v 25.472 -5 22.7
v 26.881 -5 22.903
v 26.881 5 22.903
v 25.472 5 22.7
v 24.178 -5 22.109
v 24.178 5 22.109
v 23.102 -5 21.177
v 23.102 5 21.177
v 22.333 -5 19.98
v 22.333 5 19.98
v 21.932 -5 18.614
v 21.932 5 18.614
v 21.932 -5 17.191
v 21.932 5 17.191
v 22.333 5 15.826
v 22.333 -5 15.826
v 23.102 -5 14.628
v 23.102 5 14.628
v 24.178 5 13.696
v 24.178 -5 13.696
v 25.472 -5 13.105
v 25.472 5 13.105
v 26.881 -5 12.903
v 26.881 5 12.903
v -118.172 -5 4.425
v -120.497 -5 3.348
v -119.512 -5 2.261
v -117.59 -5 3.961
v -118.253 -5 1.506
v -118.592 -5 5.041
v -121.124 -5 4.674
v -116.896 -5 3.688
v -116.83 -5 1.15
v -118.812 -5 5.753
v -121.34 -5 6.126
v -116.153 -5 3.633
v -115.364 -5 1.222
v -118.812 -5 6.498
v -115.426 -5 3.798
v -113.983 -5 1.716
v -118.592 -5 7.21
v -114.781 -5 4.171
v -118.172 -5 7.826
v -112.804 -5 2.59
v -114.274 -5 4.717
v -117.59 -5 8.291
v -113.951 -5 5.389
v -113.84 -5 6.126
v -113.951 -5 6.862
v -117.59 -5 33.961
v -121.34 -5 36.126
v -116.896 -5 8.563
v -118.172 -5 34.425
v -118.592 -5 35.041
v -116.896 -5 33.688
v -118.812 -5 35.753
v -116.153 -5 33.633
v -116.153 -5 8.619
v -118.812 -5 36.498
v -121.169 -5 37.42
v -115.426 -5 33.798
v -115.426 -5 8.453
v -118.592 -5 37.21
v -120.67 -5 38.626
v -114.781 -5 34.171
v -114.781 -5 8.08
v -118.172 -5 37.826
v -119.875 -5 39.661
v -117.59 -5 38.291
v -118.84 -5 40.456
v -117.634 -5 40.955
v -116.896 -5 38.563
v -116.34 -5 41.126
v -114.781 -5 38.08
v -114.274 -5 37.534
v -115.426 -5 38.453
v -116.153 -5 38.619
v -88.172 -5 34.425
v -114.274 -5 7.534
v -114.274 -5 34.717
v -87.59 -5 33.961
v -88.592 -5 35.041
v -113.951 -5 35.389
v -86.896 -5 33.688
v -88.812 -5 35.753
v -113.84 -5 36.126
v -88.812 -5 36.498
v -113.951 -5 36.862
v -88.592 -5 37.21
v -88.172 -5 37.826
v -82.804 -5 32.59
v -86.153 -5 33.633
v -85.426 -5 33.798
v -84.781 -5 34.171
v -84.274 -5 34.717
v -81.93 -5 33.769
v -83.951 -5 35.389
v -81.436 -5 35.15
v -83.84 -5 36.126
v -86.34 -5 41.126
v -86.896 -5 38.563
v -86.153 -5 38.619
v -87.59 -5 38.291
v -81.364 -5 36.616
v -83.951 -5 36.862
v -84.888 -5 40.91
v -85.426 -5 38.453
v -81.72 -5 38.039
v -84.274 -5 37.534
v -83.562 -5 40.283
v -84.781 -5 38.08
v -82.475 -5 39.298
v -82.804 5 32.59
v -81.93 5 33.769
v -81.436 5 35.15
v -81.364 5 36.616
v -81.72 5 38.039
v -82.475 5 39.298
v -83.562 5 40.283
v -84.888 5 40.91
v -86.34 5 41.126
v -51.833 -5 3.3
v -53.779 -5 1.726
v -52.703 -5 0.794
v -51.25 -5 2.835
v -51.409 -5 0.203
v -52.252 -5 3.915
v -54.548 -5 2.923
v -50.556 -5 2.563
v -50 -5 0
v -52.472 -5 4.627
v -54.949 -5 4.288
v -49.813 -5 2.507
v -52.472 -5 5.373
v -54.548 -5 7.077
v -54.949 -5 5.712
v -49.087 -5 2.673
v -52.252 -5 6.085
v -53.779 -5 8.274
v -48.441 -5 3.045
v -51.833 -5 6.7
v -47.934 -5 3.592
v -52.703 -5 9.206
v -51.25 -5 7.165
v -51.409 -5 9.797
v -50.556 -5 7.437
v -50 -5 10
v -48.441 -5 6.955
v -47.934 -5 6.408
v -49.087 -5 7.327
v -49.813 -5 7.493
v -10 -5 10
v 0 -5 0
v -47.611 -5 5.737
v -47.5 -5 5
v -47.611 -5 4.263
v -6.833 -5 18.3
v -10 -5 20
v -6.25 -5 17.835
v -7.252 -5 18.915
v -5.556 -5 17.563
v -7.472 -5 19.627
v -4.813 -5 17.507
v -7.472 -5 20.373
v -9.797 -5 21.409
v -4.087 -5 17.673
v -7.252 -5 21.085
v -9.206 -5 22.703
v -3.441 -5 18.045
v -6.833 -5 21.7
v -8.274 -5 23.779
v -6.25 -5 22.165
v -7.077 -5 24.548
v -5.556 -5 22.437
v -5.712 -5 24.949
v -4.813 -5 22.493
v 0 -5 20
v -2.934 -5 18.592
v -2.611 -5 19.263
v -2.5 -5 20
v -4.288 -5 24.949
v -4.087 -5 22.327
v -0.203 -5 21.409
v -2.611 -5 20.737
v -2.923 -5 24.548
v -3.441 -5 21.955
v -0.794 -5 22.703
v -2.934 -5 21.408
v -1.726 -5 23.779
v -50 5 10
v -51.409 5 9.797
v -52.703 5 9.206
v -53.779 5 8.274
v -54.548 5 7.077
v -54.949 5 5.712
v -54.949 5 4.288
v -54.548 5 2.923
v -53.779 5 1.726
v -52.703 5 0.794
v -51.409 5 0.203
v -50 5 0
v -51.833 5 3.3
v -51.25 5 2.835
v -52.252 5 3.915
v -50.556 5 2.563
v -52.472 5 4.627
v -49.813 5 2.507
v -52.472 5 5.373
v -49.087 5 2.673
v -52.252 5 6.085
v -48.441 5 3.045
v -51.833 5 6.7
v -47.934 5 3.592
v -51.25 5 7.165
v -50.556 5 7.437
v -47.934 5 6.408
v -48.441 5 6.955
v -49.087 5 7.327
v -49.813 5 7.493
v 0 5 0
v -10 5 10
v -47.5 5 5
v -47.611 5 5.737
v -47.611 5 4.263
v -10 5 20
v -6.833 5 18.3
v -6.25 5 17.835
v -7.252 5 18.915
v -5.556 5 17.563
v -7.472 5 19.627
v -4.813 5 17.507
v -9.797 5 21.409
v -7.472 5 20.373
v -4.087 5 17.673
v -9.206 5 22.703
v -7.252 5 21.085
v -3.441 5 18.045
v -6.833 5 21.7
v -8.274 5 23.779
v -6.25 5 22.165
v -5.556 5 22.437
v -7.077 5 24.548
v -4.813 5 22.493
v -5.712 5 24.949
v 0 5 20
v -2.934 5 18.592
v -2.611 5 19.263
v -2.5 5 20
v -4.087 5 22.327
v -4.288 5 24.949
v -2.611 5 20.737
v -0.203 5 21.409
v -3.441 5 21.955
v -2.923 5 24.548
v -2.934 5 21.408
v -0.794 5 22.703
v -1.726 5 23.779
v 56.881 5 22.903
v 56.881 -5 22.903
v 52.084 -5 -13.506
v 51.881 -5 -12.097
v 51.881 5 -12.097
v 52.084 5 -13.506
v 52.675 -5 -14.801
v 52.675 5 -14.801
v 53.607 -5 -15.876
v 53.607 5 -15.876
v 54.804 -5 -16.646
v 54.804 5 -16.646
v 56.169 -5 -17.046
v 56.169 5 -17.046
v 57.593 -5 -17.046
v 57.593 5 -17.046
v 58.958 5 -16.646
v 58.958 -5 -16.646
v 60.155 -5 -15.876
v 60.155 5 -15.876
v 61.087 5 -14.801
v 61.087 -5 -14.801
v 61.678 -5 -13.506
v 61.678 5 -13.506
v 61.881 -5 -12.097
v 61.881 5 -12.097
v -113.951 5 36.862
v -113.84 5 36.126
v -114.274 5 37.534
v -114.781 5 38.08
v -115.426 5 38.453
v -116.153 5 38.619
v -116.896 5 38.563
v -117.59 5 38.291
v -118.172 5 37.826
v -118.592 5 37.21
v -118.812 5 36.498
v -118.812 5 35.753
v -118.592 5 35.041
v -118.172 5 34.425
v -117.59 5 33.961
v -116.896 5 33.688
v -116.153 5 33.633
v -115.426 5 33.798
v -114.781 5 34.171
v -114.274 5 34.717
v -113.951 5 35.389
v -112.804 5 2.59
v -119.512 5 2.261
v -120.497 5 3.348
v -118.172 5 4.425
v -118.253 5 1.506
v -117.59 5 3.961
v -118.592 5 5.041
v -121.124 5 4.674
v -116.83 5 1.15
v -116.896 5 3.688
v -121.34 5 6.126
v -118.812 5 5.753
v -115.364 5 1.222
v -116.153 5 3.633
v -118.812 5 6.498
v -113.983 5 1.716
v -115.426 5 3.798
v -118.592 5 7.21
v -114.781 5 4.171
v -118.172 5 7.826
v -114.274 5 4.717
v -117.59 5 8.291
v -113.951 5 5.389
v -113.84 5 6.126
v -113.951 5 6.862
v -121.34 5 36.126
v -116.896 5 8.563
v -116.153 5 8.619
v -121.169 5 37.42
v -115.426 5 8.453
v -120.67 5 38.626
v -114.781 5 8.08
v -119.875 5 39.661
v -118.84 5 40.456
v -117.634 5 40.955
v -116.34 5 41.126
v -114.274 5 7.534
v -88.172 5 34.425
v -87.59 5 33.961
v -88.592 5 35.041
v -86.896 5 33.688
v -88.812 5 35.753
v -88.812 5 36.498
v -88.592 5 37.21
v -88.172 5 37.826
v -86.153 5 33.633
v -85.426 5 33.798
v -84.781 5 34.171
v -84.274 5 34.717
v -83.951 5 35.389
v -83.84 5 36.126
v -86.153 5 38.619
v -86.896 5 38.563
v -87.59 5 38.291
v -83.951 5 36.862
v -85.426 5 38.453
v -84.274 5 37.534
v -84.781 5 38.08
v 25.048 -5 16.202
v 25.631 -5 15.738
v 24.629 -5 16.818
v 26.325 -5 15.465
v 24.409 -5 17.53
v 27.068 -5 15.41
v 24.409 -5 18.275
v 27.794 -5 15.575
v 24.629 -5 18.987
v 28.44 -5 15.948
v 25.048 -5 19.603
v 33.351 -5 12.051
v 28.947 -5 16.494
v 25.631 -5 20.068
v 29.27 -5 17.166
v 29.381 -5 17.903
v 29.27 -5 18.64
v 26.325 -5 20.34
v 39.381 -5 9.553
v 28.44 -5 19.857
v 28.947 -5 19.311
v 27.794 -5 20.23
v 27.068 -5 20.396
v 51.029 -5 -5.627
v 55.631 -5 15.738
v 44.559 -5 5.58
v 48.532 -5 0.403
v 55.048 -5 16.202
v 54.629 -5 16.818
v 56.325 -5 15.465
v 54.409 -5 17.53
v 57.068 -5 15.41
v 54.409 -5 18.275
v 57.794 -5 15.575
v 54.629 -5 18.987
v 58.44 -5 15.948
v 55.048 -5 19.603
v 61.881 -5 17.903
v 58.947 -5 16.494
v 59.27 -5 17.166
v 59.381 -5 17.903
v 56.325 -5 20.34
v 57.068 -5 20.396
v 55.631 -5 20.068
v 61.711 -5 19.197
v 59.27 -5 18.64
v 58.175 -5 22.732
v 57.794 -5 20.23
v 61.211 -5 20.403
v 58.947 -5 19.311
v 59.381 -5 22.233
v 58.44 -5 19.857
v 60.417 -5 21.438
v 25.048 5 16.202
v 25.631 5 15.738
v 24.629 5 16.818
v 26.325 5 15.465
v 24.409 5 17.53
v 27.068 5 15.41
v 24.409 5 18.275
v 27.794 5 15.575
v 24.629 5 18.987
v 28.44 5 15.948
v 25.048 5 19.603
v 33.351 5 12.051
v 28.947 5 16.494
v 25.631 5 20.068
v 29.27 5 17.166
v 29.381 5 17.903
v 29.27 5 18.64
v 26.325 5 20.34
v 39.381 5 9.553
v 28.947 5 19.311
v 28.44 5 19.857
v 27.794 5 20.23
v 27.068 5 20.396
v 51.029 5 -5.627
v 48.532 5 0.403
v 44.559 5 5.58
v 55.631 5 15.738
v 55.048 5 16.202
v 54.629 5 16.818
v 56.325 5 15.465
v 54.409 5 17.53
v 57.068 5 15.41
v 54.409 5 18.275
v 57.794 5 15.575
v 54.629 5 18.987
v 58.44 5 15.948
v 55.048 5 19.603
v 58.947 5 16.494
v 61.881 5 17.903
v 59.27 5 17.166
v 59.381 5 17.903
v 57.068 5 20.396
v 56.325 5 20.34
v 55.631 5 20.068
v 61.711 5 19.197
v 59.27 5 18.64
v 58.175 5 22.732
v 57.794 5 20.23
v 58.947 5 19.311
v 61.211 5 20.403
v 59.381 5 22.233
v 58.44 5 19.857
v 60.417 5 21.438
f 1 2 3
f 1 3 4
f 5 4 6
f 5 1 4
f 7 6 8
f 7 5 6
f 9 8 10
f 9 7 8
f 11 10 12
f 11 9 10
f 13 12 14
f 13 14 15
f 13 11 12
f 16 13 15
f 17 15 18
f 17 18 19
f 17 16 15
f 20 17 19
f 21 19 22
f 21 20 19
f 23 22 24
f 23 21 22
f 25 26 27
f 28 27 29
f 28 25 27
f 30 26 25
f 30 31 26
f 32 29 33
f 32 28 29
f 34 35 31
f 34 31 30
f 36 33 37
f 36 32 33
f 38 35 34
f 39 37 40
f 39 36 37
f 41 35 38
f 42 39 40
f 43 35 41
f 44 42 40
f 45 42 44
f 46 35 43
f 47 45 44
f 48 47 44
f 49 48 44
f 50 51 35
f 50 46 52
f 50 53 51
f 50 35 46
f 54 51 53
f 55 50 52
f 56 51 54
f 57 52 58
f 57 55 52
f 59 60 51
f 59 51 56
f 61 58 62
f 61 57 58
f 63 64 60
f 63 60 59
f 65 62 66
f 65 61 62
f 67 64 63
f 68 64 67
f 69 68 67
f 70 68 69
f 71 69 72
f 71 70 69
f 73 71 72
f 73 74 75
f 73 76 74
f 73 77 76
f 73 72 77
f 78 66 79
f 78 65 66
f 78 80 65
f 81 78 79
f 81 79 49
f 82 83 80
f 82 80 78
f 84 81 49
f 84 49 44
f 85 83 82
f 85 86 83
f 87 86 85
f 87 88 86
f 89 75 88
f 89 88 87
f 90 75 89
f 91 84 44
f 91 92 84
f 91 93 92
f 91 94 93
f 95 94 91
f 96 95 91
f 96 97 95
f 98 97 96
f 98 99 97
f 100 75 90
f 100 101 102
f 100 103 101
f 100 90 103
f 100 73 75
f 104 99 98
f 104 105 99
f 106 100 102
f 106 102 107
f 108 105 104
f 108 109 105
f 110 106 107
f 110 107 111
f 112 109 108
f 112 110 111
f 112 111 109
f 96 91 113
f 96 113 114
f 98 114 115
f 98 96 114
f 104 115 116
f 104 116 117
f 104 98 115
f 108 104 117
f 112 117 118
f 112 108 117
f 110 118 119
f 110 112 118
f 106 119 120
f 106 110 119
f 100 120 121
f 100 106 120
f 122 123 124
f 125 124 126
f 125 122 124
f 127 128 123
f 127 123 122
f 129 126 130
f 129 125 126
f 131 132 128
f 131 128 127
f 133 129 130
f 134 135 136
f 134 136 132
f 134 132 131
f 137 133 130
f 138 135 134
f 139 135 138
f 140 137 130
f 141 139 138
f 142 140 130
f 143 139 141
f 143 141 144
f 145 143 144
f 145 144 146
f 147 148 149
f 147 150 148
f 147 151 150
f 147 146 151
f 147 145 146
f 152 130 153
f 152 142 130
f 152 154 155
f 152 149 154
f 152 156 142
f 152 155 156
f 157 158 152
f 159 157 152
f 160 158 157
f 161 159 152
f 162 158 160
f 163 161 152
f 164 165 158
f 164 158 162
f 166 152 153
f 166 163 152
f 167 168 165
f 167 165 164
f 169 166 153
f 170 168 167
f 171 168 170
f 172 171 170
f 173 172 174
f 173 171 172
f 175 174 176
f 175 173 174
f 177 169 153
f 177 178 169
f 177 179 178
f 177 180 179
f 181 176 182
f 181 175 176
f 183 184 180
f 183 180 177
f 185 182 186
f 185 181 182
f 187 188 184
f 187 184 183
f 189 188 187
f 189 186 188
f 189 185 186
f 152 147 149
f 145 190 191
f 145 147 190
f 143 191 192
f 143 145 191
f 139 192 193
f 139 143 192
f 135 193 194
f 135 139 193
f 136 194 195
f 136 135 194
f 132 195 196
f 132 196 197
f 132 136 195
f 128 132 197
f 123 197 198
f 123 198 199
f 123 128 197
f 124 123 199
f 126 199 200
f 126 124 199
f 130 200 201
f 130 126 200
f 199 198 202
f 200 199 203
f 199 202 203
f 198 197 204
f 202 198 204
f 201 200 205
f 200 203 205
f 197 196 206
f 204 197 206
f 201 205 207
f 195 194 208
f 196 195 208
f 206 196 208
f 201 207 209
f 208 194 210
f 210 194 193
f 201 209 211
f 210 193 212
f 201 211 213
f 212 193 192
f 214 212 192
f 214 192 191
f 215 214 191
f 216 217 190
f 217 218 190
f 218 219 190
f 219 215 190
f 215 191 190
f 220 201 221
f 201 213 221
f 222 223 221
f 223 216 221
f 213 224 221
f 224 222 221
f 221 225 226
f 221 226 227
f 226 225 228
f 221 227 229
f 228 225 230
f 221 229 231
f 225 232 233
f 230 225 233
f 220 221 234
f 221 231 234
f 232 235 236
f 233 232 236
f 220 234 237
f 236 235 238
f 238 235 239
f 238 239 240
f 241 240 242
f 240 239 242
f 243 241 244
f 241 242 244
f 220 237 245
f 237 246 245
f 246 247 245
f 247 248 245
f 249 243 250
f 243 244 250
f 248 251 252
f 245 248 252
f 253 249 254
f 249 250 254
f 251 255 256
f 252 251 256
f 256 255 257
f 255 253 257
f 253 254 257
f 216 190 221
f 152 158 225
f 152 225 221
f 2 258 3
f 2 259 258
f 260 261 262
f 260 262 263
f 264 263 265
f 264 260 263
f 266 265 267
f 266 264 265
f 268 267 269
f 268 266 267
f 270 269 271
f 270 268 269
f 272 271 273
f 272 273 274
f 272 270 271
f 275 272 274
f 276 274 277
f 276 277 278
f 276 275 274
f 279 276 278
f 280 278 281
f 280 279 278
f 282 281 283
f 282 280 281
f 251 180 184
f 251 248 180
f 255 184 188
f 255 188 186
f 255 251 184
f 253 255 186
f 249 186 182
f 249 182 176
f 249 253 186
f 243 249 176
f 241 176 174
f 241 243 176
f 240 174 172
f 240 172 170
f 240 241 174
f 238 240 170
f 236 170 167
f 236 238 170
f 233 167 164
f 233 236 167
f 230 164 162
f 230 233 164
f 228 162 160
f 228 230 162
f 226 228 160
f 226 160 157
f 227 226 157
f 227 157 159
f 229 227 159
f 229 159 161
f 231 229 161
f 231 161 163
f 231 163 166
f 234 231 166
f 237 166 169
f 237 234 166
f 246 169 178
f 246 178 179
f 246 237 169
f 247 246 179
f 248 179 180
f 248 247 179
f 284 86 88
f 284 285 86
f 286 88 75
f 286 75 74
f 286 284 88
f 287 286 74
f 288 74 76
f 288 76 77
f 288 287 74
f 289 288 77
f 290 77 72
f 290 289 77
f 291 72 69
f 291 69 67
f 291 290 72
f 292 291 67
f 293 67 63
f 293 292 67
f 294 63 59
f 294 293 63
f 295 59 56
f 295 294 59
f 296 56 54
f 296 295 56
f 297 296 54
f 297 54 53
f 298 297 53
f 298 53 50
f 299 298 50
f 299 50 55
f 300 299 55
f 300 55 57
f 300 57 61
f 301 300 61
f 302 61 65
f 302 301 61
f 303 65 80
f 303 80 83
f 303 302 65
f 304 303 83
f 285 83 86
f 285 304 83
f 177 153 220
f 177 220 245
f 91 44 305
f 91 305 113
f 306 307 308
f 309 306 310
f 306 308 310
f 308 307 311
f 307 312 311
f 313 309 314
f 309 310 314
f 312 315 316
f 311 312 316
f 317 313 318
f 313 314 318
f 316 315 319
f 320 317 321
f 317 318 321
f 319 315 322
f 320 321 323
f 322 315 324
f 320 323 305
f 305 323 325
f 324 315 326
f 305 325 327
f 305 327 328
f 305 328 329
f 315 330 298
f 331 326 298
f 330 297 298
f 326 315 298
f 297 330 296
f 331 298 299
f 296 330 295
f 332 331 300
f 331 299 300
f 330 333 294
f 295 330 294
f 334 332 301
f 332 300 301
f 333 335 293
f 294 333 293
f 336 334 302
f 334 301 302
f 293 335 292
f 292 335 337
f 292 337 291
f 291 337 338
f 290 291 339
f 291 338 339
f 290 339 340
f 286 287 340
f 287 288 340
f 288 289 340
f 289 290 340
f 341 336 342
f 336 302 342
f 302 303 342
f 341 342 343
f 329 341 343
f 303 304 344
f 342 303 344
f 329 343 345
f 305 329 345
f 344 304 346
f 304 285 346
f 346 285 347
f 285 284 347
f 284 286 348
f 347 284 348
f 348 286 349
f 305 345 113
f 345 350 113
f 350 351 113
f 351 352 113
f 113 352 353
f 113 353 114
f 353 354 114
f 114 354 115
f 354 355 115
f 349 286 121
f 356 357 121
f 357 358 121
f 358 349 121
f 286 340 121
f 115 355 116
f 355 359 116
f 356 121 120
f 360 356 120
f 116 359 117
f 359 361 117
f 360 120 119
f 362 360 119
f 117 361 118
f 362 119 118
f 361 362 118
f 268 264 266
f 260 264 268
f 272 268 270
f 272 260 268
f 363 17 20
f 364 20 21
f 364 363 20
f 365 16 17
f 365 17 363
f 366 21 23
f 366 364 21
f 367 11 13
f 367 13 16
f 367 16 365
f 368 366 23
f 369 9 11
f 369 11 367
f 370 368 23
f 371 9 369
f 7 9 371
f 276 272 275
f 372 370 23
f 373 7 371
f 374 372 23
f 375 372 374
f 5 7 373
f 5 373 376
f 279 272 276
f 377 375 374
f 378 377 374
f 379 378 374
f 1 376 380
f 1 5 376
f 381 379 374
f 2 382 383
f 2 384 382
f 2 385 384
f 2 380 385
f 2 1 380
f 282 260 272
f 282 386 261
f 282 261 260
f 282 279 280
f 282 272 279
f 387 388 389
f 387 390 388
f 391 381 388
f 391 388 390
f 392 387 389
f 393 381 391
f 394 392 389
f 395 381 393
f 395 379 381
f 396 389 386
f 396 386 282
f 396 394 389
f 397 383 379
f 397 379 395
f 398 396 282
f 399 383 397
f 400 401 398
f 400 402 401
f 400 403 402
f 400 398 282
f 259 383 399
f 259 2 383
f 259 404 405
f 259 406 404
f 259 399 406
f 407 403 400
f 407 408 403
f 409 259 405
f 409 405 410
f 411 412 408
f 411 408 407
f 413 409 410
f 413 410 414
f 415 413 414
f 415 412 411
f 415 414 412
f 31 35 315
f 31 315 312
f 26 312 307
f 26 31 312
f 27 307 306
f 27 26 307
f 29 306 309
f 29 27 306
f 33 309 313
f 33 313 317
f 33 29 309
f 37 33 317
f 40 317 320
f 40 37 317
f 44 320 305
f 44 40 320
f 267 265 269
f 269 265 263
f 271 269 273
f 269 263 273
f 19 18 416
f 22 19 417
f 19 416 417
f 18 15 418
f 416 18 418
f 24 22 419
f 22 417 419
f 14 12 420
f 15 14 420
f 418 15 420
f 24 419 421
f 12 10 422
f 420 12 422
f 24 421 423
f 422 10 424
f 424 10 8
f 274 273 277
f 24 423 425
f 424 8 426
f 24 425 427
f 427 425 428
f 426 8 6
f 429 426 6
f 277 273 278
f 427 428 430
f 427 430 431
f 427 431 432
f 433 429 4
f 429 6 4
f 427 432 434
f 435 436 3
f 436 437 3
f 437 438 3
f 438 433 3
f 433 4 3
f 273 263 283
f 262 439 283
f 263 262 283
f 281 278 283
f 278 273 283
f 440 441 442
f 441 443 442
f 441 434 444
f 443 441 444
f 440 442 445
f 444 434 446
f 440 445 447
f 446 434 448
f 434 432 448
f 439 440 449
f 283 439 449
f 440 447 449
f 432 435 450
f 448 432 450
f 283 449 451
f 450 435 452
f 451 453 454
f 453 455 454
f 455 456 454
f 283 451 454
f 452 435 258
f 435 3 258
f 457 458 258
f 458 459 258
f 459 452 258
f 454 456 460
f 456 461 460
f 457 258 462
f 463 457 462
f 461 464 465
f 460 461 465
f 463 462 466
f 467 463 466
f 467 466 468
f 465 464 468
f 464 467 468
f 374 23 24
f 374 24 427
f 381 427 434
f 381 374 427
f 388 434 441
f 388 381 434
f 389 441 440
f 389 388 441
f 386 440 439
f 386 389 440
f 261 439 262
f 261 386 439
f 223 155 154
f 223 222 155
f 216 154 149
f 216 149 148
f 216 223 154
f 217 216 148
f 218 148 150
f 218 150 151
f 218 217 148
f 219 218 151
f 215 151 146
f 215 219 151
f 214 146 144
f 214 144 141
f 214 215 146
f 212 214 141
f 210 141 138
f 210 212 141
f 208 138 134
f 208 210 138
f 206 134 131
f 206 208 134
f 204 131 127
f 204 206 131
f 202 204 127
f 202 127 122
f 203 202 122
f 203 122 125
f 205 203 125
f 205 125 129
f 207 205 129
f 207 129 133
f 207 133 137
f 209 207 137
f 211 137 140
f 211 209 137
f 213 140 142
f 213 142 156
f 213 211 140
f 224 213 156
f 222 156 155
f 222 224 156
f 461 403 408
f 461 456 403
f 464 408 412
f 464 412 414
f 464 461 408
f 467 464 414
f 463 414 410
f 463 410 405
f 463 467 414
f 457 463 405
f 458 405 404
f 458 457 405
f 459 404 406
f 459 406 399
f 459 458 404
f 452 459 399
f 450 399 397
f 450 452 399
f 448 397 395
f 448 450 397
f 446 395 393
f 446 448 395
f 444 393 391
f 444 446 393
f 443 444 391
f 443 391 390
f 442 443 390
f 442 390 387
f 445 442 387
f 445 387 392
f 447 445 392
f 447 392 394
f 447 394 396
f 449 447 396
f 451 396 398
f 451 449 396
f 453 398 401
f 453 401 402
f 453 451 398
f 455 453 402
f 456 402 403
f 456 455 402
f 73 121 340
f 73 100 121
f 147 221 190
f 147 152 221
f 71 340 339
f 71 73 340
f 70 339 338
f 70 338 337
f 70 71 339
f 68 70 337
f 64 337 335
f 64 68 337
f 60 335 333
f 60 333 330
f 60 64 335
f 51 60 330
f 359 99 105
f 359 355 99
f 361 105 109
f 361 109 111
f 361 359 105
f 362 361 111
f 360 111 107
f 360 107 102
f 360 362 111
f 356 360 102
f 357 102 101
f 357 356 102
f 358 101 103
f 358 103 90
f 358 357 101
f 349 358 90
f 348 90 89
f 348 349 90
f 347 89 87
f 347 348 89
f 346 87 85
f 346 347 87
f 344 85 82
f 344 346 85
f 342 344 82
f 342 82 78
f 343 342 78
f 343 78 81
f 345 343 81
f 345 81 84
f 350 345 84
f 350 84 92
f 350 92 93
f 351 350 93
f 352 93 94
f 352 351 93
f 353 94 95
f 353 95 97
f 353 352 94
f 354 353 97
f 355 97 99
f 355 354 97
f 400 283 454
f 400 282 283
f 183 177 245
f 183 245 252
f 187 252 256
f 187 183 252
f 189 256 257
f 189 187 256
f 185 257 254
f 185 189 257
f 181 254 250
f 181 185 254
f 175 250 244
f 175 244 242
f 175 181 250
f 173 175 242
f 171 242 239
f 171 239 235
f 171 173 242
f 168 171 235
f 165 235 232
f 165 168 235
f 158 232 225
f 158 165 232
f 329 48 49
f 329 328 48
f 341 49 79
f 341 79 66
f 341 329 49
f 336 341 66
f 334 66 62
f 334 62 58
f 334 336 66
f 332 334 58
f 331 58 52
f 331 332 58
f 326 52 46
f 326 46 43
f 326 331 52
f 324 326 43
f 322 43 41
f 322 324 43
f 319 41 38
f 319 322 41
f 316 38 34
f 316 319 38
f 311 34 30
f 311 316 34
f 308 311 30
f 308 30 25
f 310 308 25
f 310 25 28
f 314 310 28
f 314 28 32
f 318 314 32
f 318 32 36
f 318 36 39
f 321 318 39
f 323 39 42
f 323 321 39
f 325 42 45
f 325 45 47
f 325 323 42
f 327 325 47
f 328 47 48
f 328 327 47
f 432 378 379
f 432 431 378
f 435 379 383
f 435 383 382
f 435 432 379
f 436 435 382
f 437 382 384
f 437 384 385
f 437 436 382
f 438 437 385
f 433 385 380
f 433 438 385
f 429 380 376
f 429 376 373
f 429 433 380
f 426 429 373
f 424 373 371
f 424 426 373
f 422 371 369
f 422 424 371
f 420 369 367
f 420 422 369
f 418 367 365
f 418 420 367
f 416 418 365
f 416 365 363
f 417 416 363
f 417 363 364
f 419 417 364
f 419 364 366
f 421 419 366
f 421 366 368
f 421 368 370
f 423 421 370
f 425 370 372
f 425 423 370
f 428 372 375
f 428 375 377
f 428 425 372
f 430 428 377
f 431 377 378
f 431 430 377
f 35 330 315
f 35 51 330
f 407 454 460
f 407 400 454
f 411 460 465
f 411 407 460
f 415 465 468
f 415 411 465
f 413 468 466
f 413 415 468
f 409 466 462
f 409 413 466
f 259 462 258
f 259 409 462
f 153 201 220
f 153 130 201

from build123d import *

# Parameters (mm, degrees)
F0_R     = 2.5
F1_DEPTH = 5
F2_R     = 2.5
F3_DEPTH = 5
F4_R     = 2.5
F5_DEPTH = 5


with BuildPart() as f1:
    # F0 (on Front) → F1 (new body, symmetric)
    with BuildSketch(Plane.XZ):
        with BuildLine():
            Line((-50, 0), (0, 0))
            Line((0, 0), (0, 20))
            ThreePointArc((0, 20), (-5, 25), (-10, 20))
            Line((-10, 20), (-10, 10))
            Line((-10, 10), (-50, 10))
            ThreePointArc((-50, 10), (-55, 5), (-50, 0))
        make_face()
        with Locations((-50, 5)):
            Circle(F0_R, mode=Mode.SUBTRACT)
        with Locations((-5, 20)):
            Circle(F0_R, mode=Mode.SUBTRACT)
    extrude(amount=F1_DEPTH, both=True)


with BuildPart() as f3:
    # F2 (on Front) → F3 (new body, symmetric)
    with BuildSketch(Plane.XZ):
        with BuildLine():
            Line((-121.3395705819, 36.1255854368), (-121.3395705819, 6.1255854368))
            ThreePointArc((-121.3395705819, 6.1255854368), (-118.2529877437, 1.5061877743), (-112.804036676, 2.5900515309))
            Line((-112.804036676, 2.5900515309), (-82.804036676, 32.5900515309))
            ThreePointArc((-82.804036676, 32.5900515309), (-81.7201729194, 38.0390025986), (-86.3395705819, 41.1255854368))
            Line((-86.3395705819, 41.1255854368), (-116.3395705819, 41.1255854368))
            ThreePointArc((-116.3395705819, 41.1255854368), (-119.8751044878, 39.6611193428), (-121.3395705819, 36.1255854368))
        make_face()
        with Locations((-116.3395705819, 6.1255854368)):
            Circle(F2_R, mode=Mode.SUBTRACT)
        with Locations((-116.3395705819, 36.1255854368)):
            Circle(F2_R, mode=Mode.SUBTRACT)
        with Locations((-86.3395705819, 36.1255854368)):
            Circle(F2_R, mode=Mode.SUBTRACT)
    extrude(amount=F3_DEPTH, both=True)


with BuildPart() as f5:
    # F4 (on Front) → F5 (new body, symmetric)
    with BuildSketch(Plane.XZ):
        with BuildLine():
            Line((56.8809987468, 22.9026412712), (26.8809987468, 22.9026412712))
            ThreePointArc((26.8809987468, 22.9026412712), (21.8809987468, 17.9026412712), (26.8809987468, 12.9026412712))
            ThreePointArc((26.8809987468, 12.9026412712), (44.5586682765, 5.5803108008), (51.8809987468, -12.0973587288))
            ThreePointArc((51.8809987468, -12.0973587288), (56.8809987468, -17.0973587288), (61.8809987468, -12.0973587288))
            Line((61.8809987468, -12.0973587288), (61.8809987468, 17.9026412712))
            ThreePointArc((61.8809987468, 17.9026412712), (60.4165326527, 21.4381751771), (56.8809987468, 22.9026412712))
        make_face()
        with Locations((26.8809987468, 17.9026412712)):
            Circle(F4_R, mode=Mode.SUBTRACT)
        with Locations((56.8809987468, 17.9026412712)):
            Circle(F4_R, mode=Mode.SUBTRACT)
    extrude(amount=F5_DEPTH, both=True)


solid = Compound([f1.part, f3.part, f5.part])
